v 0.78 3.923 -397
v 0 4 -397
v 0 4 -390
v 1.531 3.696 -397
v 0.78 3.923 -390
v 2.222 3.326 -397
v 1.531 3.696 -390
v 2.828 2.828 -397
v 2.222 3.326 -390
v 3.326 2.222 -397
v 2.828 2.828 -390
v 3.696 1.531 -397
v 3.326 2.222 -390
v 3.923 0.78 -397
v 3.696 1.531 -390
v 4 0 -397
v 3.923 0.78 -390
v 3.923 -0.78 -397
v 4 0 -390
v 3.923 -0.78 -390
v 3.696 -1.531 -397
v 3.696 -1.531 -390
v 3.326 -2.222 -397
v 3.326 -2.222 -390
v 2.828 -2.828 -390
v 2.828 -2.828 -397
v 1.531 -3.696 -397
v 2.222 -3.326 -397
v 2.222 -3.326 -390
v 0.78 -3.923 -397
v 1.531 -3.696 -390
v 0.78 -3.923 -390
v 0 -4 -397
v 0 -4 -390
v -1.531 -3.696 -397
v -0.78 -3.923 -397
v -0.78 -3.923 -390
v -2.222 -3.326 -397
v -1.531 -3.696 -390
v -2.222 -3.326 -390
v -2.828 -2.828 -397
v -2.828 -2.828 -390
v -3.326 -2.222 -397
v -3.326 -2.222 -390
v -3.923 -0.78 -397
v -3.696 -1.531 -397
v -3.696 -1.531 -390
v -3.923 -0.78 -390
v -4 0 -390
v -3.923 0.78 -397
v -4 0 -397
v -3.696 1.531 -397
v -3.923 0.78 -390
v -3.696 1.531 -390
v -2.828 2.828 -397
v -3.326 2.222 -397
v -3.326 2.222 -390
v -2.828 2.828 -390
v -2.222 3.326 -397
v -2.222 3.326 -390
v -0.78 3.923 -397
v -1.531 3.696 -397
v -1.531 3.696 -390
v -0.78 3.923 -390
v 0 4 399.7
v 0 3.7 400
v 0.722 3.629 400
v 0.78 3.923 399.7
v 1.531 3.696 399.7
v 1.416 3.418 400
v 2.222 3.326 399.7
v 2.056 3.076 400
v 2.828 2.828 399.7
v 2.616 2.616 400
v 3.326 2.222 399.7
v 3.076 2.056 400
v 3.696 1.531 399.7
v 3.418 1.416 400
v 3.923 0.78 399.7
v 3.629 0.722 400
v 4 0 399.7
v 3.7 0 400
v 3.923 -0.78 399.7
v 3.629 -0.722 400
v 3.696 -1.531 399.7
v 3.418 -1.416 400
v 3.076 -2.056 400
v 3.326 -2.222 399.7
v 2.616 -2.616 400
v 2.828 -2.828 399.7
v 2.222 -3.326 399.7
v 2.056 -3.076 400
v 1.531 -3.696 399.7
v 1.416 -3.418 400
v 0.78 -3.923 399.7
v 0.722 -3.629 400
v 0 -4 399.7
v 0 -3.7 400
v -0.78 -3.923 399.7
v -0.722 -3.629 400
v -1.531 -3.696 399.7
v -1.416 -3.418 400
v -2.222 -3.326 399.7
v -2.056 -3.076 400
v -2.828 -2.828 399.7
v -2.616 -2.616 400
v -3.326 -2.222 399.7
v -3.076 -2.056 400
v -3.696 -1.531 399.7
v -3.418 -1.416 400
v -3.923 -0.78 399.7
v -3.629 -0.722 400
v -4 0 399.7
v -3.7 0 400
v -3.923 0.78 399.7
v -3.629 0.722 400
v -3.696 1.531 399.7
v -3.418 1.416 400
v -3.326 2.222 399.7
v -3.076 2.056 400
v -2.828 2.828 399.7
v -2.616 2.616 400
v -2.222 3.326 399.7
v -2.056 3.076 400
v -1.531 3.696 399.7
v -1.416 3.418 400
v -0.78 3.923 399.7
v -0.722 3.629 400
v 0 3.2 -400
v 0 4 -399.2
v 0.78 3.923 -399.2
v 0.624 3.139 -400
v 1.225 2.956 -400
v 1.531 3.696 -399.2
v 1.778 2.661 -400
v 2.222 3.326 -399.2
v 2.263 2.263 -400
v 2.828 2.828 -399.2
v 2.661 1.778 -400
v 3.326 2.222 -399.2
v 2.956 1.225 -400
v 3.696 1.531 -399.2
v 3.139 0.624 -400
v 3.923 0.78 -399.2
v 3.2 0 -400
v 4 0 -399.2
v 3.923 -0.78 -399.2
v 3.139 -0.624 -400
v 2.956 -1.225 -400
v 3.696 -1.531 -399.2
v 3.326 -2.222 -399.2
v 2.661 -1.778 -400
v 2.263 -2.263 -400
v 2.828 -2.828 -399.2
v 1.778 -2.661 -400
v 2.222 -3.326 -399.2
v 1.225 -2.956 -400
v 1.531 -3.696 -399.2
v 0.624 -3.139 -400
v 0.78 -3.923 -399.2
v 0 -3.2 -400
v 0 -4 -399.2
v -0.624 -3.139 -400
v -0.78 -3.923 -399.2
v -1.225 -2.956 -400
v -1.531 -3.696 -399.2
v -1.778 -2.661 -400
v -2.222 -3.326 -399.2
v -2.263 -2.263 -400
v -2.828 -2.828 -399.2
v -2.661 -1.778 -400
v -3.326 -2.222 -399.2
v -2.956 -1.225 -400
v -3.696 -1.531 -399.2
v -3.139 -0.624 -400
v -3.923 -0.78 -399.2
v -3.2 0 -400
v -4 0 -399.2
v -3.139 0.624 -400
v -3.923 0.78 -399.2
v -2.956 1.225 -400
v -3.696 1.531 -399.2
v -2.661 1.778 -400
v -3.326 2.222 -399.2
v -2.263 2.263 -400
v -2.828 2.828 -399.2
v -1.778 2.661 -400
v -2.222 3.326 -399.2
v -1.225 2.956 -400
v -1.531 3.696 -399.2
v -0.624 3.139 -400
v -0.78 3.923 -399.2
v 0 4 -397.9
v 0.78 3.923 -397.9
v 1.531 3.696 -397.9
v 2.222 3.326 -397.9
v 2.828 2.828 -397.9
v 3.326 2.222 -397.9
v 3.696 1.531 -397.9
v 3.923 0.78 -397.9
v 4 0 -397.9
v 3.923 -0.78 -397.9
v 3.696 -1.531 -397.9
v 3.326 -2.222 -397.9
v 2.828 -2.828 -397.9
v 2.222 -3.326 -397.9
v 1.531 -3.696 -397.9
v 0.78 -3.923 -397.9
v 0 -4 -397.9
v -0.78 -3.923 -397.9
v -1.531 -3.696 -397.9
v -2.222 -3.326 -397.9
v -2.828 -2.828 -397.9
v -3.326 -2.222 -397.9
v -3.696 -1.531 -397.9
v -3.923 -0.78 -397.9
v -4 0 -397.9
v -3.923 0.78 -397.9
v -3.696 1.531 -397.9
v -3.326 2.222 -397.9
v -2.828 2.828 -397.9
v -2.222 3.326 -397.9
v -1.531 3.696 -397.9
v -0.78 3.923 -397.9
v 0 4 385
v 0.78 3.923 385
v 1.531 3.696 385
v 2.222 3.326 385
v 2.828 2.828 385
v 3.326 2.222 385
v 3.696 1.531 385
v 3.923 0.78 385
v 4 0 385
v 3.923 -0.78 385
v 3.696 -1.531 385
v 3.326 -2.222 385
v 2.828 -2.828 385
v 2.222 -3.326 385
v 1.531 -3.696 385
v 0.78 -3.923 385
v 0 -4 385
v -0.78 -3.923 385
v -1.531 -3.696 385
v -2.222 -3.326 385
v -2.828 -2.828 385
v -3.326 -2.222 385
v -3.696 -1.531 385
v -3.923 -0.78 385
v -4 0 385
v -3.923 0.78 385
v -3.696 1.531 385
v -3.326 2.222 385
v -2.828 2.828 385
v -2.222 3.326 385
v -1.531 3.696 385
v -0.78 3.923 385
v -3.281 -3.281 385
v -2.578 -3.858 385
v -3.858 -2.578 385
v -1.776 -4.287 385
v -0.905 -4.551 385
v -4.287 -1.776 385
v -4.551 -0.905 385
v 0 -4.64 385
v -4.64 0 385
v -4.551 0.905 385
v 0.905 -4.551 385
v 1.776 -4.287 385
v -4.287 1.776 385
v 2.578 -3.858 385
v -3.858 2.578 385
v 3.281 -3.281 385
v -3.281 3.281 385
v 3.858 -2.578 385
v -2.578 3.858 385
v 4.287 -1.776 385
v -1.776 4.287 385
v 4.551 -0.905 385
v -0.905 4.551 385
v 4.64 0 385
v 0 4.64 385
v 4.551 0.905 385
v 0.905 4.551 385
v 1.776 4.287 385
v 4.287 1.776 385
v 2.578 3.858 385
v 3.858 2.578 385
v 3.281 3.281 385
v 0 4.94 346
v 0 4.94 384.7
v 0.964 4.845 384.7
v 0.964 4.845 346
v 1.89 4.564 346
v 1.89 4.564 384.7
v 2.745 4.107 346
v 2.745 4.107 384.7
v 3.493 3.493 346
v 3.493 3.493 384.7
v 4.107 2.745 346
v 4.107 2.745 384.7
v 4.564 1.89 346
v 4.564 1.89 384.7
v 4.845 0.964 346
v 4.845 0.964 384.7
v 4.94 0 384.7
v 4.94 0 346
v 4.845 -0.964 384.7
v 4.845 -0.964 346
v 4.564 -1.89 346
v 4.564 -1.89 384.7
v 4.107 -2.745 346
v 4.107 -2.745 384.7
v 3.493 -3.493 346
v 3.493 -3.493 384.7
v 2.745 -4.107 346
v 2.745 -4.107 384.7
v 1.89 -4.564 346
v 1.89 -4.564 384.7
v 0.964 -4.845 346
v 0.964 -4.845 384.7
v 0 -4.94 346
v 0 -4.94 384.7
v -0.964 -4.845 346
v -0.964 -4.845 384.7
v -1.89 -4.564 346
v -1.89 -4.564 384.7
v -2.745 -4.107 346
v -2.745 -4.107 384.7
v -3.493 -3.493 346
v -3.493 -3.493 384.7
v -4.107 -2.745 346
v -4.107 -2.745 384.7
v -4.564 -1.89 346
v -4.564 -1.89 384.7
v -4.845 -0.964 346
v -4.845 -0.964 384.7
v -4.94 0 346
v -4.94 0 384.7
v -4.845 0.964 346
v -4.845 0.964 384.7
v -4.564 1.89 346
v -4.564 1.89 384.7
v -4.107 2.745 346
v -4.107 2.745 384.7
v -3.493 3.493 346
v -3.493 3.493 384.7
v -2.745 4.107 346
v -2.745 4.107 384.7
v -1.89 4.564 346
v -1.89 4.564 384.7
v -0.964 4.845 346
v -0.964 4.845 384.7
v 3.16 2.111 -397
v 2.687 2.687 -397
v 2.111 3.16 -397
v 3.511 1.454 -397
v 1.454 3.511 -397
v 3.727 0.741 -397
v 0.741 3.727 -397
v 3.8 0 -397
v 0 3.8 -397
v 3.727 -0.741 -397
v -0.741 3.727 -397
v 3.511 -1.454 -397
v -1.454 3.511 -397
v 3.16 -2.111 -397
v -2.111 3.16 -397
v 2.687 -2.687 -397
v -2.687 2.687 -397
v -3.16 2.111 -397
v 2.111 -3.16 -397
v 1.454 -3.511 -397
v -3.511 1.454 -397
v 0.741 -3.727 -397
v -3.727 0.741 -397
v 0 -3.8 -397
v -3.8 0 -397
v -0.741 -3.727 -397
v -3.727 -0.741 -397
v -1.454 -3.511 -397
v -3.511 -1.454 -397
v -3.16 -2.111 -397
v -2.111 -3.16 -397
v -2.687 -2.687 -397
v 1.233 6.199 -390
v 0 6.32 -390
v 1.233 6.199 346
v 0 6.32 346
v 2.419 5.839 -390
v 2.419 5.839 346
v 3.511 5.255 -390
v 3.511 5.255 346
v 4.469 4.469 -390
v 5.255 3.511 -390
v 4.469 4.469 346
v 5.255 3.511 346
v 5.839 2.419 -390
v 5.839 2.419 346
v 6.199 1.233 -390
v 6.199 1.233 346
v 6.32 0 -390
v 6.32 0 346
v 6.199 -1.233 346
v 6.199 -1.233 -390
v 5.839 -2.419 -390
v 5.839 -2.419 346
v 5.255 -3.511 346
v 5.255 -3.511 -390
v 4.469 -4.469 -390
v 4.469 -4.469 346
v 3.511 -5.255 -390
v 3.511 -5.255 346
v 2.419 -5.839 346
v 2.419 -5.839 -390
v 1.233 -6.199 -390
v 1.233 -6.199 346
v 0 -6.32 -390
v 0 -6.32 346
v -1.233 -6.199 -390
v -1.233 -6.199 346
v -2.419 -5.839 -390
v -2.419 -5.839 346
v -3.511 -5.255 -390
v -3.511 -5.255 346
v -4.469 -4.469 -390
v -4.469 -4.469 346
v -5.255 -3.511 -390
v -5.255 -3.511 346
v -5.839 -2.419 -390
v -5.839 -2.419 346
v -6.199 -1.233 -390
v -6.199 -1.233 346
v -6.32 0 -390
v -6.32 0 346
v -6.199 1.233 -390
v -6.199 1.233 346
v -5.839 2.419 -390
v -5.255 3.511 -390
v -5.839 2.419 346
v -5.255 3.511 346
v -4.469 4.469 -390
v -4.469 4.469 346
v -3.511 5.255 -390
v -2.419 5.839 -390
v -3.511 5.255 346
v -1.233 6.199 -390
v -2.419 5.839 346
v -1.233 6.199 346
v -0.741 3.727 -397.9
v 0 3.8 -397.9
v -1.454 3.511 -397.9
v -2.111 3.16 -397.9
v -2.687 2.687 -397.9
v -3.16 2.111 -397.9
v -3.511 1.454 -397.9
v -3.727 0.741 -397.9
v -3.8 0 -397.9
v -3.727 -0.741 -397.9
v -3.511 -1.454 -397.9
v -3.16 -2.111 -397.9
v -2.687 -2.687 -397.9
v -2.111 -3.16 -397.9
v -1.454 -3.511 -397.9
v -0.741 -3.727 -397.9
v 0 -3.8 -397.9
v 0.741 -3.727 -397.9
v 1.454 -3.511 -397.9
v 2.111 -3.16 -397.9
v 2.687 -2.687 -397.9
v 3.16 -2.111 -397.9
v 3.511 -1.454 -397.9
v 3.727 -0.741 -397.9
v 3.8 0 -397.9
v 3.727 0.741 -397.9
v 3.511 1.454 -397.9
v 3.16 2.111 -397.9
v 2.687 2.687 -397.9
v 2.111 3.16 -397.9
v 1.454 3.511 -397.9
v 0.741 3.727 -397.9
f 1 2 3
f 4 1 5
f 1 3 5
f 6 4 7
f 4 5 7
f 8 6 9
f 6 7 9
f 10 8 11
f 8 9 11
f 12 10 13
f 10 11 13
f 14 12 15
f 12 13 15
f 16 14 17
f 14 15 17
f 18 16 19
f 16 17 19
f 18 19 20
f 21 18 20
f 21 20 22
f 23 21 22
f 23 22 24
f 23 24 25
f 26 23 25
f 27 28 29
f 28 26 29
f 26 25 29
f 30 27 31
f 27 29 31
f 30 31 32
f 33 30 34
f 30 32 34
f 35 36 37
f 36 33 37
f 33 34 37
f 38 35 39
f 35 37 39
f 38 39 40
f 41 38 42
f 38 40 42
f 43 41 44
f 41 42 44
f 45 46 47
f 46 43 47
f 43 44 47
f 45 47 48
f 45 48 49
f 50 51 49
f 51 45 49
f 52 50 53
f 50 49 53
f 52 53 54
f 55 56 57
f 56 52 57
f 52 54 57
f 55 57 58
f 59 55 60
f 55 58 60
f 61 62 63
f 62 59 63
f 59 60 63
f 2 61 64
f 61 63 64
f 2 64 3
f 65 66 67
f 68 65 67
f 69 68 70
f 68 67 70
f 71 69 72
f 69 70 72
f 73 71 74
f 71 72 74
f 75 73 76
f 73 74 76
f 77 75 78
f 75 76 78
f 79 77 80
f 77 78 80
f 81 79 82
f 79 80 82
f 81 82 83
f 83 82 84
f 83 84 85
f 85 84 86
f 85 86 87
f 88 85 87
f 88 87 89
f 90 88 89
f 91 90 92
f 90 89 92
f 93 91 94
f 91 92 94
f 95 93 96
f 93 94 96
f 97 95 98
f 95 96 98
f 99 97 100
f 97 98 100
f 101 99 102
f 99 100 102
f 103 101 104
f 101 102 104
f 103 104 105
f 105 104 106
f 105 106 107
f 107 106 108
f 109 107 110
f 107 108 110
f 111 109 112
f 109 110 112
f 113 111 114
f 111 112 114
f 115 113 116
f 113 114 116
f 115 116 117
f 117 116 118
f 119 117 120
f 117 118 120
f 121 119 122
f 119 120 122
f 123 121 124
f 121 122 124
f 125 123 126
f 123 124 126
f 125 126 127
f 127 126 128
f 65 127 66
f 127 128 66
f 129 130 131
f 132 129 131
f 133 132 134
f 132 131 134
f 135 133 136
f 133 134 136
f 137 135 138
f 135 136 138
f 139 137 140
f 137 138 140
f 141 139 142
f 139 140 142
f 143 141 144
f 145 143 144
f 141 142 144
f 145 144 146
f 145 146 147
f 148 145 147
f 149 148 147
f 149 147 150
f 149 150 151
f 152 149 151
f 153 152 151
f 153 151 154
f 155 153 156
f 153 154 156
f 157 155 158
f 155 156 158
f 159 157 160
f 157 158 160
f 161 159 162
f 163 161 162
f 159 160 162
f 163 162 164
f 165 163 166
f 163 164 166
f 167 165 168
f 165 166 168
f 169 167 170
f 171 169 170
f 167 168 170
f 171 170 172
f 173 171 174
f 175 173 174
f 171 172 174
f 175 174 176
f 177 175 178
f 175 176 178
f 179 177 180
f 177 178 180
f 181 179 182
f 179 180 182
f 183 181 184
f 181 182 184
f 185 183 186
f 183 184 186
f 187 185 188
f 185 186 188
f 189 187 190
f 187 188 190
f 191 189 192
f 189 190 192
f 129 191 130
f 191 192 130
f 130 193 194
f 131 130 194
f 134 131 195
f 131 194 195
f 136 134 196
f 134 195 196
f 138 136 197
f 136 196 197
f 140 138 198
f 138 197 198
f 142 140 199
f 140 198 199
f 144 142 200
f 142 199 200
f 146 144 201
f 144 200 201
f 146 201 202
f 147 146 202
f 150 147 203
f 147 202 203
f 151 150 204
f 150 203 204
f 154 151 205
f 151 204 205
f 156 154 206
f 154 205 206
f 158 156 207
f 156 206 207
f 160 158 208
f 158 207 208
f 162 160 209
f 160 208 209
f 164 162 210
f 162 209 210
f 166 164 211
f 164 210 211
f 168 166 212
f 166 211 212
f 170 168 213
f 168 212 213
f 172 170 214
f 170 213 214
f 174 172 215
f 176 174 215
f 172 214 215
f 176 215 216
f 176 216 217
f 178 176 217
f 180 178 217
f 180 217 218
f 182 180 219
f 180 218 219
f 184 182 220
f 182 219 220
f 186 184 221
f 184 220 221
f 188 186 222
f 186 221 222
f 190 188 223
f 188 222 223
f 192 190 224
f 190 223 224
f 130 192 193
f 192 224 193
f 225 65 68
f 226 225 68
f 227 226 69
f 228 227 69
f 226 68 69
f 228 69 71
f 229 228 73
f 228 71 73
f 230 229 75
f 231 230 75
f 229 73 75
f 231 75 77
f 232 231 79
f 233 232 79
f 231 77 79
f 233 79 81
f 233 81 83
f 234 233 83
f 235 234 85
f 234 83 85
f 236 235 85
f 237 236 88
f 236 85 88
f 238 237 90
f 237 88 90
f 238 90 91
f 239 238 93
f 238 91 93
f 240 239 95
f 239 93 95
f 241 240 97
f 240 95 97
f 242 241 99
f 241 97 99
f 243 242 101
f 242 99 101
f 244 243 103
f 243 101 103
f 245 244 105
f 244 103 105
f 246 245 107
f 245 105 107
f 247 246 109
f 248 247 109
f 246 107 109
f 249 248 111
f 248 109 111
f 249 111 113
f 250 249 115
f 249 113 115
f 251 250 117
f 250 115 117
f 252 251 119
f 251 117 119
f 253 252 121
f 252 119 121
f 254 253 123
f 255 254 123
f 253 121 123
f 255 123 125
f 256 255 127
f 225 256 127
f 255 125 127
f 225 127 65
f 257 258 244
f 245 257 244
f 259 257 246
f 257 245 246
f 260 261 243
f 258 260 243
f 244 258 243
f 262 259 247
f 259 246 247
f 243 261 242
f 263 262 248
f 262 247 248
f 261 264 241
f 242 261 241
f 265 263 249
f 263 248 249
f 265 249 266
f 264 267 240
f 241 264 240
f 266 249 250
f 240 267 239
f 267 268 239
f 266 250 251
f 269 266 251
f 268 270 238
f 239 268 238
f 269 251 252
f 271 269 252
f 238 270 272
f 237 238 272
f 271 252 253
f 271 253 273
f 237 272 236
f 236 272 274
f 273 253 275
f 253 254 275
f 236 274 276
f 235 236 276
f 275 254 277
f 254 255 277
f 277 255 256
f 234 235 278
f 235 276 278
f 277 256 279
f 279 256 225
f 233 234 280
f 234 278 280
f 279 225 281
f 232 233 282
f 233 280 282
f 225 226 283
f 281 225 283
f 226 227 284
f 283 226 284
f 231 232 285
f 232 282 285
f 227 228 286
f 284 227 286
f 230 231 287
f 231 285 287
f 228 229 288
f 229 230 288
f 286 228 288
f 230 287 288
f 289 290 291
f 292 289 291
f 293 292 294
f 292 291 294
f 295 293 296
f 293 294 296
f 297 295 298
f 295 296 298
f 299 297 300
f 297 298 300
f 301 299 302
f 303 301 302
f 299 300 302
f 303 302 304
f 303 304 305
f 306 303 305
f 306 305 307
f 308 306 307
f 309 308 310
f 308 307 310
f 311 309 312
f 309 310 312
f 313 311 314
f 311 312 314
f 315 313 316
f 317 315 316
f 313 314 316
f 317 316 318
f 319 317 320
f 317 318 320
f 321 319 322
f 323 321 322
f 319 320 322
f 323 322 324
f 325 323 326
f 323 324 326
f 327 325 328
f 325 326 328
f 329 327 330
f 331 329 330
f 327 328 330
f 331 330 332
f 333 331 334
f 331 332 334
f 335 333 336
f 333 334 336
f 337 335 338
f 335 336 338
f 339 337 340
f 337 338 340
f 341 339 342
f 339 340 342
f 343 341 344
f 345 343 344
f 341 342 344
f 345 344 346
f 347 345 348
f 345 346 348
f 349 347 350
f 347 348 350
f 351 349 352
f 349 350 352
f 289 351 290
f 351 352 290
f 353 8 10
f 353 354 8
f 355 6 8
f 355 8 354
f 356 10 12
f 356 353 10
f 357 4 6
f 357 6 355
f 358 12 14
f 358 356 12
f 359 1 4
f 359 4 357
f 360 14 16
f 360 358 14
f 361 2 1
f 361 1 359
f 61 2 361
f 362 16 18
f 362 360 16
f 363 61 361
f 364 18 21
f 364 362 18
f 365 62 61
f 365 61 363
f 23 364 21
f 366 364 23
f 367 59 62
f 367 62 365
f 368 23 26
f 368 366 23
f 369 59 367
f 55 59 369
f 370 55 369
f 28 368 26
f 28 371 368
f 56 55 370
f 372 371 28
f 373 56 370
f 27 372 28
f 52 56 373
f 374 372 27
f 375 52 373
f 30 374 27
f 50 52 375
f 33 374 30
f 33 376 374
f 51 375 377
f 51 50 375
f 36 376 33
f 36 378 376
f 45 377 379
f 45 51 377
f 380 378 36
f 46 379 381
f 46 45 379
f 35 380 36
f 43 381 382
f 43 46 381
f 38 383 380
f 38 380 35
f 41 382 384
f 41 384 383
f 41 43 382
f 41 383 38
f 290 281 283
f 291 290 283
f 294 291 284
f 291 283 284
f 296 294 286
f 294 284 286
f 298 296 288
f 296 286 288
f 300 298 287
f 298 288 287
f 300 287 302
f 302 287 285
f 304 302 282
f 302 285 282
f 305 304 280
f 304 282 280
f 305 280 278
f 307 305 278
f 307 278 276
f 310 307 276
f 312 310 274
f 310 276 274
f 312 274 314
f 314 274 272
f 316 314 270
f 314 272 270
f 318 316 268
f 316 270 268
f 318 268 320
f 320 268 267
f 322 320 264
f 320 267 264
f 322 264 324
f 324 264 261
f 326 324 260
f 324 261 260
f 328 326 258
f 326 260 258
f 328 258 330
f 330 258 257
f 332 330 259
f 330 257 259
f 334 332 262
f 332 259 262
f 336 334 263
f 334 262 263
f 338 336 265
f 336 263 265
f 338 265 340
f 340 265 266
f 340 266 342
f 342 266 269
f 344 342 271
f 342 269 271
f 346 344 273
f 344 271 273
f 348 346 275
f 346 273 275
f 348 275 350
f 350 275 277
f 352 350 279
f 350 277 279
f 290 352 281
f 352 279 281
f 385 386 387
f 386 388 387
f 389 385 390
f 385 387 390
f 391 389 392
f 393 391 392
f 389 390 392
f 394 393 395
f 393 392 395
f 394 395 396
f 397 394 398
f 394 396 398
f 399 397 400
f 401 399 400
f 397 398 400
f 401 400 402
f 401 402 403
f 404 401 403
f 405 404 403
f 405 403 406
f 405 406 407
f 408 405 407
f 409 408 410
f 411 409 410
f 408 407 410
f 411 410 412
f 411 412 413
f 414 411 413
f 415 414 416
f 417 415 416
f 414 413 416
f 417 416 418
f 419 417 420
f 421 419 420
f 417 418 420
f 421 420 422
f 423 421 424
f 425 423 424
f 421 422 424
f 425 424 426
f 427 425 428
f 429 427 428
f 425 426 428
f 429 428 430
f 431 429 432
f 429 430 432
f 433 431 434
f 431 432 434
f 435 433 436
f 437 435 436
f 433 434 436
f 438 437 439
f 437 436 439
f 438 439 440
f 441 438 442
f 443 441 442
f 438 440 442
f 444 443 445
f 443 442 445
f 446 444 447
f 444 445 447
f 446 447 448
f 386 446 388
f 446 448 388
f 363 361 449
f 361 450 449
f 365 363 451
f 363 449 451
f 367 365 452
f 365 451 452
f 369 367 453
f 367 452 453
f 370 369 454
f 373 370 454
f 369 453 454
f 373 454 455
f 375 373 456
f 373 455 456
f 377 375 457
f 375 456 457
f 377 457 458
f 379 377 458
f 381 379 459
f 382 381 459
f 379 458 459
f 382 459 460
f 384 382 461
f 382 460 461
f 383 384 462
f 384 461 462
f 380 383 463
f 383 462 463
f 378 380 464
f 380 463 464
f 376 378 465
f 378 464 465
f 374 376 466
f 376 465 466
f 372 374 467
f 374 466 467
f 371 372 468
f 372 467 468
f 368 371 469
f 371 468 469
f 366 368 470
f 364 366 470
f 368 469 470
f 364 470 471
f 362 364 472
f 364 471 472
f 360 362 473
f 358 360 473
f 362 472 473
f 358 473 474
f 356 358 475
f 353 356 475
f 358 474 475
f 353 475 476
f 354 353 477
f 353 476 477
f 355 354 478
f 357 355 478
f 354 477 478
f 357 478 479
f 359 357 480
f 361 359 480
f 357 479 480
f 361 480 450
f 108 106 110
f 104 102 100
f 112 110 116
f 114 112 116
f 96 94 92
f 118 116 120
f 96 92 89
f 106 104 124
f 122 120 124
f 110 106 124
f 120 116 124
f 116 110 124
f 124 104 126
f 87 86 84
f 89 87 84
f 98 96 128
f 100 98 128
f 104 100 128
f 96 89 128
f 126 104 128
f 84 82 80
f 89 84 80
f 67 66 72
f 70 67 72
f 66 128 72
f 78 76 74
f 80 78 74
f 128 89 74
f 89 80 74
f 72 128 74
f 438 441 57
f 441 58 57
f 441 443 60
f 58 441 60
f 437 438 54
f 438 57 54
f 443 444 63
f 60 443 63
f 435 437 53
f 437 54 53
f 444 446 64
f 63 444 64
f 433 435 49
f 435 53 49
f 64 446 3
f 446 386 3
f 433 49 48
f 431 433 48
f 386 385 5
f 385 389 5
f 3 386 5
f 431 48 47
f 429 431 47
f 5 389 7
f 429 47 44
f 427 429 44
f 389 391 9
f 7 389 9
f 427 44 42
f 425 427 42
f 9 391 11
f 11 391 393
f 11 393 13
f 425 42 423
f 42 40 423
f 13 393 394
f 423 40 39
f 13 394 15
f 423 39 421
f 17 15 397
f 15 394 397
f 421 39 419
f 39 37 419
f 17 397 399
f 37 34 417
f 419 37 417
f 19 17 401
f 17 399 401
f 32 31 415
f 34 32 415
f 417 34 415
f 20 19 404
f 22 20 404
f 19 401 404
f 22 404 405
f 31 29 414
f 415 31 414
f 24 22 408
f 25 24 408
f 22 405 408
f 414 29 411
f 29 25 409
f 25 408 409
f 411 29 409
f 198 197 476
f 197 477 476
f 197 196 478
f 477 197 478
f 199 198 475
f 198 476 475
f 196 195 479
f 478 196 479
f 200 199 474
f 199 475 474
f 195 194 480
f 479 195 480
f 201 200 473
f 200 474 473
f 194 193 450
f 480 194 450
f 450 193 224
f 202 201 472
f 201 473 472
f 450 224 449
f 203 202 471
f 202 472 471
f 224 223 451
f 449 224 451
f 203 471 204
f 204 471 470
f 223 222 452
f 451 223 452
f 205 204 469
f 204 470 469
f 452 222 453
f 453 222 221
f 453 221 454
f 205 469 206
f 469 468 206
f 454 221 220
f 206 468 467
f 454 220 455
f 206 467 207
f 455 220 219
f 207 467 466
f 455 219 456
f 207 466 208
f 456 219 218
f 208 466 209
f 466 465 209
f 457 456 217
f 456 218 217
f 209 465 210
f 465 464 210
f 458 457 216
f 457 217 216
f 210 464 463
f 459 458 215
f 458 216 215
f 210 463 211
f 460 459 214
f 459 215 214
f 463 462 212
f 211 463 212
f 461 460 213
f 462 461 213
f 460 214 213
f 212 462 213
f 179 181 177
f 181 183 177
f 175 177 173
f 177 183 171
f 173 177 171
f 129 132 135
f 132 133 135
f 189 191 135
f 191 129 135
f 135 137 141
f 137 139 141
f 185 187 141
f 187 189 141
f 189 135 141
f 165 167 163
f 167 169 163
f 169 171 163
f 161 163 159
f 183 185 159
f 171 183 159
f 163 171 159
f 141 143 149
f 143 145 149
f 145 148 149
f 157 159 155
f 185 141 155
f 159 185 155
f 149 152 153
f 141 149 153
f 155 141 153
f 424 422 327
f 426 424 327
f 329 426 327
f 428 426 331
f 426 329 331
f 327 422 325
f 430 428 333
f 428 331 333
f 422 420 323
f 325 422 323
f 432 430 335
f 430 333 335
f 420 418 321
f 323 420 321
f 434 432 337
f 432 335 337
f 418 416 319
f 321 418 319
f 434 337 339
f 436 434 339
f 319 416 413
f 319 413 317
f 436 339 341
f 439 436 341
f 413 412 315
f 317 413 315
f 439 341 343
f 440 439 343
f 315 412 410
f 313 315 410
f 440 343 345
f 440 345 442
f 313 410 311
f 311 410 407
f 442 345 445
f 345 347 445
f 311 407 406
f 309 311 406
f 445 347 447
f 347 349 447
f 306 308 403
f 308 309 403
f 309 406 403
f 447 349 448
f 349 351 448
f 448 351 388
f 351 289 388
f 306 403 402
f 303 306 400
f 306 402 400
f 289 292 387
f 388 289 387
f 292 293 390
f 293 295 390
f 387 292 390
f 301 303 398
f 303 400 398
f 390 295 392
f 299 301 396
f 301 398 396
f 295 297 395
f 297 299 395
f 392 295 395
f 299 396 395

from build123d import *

# Parameters (mm, degrees)
SKETCH2_W     = 0.9
SKETCH2_H     = 0.2
CHAMFER1_SIZE = 0.8
CHAMFER2_SIZE = 0.3


with BuildPart() as part:
    # Sketch1 → Revolve1 (revolve)
    with BuildSketch(Plane(origin=(0, 0, 0), x_dir=(0, 0, -1), z_dir=(1, 0, 0))):
        Polygon((-400, 0), (400, 0), (400, 4), (390, 4), (390, 6.32), (-346, 6.32), (-346, 4.94), (-385, 4.94), (-385, 4), (-400, 4), align=None)
    revolve(axis=Axis((0, 0, 400), (0, 0, -1)))

    # Sketch2 → Cut-Revolve1 (revolve, cut)
    with BuildSketch(Plane(origin=(0, 0, 0), x_dir=(0, 0, -1), z_dir=(1, 0, 0))):
        with Locations((397.45, 3.9)):
            Rectangle(SKETCH2_W, SKETCH2_H)
    revolve(axis=Axis((0, 0, -400), (0, 0, 1)), mode=Mode.SUBTRACT)

    # Chamfer1
    chamfer1_edges = [part.edges().sort_by_distance(p)[0] for p in [
        (0, -4, -400),
    ]]
    chamfer(chamfer1_edges, length=CHAMFER1_SIZE)

    # Chamfer2
    chamfer2_edges = [part.edges().sort_by_distance(p)[0] for p in [
        (0, -4.94, 385),
        (0, -4, 400),
    ]]
    chamfer(chamfer2_edges, length=CHAMFER2_SIZE)


solid = part.part
